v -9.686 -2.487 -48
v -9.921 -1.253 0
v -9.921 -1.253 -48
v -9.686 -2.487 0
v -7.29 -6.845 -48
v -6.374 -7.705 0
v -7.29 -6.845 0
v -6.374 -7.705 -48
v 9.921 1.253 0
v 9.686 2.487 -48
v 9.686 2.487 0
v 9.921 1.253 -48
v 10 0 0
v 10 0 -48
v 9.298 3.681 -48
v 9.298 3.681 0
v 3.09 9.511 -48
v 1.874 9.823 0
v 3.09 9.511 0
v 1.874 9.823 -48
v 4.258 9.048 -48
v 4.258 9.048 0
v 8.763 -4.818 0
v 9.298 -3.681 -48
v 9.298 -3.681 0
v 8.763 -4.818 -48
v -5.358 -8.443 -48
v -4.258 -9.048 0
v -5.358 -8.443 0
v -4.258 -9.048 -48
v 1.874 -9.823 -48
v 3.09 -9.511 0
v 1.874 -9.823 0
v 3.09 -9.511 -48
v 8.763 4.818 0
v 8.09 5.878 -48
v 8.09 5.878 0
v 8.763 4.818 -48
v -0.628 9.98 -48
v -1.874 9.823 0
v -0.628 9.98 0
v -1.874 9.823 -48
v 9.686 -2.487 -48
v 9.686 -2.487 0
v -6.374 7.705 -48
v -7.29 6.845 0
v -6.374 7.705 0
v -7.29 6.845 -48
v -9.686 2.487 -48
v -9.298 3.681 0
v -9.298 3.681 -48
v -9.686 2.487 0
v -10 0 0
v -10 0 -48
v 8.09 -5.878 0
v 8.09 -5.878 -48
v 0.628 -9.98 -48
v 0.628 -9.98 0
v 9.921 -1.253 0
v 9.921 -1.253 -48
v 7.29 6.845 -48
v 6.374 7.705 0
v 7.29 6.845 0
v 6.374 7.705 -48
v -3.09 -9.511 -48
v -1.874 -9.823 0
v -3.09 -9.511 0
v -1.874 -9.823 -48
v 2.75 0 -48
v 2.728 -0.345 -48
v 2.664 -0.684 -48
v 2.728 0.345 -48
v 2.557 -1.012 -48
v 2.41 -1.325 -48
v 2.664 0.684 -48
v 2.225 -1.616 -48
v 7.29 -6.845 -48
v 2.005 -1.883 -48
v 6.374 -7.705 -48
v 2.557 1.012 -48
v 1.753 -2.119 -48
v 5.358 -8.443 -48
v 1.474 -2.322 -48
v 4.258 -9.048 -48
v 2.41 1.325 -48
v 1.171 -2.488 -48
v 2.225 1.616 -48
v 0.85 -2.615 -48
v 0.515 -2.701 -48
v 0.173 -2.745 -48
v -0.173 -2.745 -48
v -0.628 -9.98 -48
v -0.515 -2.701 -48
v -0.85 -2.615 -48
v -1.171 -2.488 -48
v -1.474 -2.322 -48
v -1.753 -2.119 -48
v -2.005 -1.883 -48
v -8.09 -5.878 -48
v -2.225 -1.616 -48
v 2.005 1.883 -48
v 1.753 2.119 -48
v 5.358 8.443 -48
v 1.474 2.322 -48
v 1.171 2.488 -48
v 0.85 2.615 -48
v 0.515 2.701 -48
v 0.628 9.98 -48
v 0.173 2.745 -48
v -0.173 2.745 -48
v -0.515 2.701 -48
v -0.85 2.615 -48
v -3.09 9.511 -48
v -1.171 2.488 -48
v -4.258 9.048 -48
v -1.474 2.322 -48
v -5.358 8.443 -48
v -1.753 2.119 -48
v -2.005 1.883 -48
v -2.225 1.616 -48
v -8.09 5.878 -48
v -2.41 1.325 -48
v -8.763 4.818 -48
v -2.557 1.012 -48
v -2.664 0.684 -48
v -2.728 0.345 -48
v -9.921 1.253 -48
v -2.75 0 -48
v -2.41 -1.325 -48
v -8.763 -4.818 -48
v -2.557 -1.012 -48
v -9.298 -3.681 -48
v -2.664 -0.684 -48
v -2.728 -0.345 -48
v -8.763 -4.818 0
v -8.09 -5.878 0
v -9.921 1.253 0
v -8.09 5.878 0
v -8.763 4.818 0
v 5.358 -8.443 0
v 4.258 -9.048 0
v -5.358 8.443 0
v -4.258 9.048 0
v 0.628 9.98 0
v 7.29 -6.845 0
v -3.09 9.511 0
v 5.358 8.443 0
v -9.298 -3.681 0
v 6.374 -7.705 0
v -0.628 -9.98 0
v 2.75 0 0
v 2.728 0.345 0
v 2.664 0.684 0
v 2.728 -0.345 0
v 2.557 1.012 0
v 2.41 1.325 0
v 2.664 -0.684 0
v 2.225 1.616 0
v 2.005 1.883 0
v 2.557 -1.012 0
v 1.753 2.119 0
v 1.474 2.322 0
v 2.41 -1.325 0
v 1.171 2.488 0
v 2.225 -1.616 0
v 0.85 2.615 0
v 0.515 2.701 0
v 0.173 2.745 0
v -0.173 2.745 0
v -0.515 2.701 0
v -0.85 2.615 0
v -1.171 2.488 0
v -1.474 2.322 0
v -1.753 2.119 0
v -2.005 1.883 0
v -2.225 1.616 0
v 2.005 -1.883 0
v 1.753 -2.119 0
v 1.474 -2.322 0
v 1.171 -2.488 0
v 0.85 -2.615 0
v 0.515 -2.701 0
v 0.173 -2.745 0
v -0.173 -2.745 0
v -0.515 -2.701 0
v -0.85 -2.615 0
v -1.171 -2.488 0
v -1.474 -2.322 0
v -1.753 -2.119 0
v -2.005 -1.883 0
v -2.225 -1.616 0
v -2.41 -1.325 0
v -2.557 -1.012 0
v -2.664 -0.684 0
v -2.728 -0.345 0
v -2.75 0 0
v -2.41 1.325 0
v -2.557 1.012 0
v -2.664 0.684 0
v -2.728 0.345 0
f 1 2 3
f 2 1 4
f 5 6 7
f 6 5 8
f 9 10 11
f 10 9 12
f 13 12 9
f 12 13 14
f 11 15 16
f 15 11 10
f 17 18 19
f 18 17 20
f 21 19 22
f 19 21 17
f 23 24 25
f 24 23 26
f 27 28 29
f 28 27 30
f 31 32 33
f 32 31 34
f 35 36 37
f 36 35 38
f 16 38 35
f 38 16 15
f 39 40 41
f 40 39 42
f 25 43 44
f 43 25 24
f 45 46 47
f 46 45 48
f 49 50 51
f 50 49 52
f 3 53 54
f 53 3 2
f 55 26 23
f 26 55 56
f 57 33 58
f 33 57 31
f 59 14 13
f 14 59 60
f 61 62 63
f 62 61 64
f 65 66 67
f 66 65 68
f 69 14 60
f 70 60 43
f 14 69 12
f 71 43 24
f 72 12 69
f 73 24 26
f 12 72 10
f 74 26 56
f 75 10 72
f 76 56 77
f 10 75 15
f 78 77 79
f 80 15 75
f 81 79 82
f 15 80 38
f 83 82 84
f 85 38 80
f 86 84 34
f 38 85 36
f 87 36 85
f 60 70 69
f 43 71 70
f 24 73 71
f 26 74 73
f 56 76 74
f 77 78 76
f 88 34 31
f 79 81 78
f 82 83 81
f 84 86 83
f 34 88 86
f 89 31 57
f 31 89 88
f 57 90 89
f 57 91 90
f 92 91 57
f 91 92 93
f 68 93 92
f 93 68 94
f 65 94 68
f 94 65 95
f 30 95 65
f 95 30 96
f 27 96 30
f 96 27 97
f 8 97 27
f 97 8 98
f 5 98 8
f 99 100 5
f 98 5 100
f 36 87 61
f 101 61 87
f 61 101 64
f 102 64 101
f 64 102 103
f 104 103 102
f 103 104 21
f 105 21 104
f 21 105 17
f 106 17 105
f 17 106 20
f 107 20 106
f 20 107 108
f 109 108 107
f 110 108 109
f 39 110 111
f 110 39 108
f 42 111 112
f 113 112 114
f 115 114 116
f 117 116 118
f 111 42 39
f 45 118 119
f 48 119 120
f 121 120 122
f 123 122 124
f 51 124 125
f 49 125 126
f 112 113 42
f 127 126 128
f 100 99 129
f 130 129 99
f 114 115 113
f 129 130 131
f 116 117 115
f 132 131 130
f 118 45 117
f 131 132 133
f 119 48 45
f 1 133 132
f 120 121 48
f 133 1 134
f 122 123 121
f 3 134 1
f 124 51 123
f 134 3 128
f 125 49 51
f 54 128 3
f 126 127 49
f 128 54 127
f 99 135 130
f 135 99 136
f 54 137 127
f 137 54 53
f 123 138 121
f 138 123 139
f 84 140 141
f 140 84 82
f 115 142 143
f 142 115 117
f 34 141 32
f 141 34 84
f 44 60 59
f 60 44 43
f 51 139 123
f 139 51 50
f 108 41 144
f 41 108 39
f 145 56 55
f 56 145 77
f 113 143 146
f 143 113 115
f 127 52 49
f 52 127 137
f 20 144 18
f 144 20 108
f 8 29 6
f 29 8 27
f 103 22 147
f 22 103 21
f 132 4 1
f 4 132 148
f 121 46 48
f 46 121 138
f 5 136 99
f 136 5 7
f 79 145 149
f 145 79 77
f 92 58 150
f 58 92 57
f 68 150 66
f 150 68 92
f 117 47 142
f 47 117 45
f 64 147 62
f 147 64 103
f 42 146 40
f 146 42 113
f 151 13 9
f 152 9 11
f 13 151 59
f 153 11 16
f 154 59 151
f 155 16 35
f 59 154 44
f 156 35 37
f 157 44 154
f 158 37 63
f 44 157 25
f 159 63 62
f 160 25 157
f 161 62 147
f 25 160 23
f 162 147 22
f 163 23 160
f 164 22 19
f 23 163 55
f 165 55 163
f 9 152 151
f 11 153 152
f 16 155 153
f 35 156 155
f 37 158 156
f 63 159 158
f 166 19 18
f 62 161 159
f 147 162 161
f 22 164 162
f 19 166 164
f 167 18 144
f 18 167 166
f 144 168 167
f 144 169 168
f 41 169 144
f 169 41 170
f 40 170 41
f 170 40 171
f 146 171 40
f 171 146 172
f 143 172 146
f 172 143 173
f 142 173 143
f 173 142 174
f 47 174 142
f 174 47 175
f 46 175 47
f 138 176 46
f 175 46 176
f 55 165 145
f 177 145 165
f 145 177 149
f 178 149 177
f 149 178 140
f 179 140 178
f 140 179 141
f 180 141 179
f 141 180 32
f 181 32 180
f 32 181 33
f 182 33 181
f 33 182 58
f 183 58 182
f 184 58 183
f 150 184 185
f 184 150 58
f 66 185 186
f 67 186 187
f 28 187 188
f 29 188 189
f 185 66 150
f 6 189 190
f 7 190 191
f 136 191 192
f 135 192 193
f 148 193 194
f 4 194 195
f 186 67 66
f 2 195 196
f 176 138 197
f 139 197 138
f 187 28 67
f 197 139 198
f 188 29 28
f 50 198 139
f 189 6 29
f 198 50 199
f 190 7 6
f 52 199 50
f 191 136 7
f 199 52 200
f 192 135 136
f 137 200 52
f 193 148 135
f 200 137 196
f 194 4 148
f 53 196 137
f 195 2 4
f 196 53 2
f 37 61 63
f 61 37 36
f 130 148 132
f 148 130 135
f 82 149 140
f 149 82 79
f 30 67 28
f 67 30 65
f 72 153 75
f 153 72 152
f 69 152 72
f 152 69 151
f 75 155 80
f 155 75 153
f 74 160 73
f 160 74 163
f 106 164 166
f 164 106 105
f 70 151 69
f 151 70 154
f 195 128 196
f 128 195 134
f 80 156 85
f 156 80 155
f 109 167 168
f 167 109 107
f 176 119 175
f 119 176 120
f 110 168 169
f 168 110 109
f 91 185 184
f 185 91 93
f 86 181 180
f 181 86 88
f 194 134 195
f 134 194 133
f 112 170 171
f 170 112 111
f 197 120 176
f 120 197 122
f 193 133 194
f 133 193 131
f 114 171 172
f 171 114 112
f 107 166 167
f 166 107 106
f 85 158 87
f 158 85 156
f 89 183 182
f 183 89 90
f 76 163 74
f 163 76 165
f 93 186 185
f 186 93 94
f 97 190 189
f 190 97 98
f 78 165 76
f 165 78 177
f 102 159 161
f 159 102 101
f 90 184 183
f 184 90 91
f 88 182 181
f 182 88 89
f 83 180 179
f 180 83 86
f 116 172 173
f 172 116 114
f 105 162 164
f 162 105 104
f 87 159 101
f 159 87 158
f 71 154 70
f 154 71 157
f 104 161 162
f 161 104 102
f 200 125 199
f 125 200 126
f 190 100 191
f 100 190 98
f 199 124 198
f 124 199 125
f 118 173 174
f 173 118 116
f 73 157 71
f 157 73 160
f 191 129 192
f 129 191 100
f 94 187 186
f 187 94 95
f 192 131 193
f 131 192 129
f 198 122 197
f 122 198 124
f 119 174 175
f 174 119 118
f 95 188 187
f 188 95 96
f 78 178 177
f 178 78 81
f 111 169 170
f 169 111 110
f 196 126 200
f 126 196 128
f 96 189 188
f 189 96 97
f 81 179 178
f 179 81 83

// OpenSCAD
$fn = 50;


difference() {
	union() {
		translate(v = [0, 0, -48.0000000000]) {
			cylinder(h = 48, r = 10.0000000000);
		}
		cylinder(h = 0, r = 20.0000000000);
	}
	union() {
		#translate(v = [0, 0, -48]) {
			cylinder(h = 48, r = 2.7500000000);
		}
	}
}
